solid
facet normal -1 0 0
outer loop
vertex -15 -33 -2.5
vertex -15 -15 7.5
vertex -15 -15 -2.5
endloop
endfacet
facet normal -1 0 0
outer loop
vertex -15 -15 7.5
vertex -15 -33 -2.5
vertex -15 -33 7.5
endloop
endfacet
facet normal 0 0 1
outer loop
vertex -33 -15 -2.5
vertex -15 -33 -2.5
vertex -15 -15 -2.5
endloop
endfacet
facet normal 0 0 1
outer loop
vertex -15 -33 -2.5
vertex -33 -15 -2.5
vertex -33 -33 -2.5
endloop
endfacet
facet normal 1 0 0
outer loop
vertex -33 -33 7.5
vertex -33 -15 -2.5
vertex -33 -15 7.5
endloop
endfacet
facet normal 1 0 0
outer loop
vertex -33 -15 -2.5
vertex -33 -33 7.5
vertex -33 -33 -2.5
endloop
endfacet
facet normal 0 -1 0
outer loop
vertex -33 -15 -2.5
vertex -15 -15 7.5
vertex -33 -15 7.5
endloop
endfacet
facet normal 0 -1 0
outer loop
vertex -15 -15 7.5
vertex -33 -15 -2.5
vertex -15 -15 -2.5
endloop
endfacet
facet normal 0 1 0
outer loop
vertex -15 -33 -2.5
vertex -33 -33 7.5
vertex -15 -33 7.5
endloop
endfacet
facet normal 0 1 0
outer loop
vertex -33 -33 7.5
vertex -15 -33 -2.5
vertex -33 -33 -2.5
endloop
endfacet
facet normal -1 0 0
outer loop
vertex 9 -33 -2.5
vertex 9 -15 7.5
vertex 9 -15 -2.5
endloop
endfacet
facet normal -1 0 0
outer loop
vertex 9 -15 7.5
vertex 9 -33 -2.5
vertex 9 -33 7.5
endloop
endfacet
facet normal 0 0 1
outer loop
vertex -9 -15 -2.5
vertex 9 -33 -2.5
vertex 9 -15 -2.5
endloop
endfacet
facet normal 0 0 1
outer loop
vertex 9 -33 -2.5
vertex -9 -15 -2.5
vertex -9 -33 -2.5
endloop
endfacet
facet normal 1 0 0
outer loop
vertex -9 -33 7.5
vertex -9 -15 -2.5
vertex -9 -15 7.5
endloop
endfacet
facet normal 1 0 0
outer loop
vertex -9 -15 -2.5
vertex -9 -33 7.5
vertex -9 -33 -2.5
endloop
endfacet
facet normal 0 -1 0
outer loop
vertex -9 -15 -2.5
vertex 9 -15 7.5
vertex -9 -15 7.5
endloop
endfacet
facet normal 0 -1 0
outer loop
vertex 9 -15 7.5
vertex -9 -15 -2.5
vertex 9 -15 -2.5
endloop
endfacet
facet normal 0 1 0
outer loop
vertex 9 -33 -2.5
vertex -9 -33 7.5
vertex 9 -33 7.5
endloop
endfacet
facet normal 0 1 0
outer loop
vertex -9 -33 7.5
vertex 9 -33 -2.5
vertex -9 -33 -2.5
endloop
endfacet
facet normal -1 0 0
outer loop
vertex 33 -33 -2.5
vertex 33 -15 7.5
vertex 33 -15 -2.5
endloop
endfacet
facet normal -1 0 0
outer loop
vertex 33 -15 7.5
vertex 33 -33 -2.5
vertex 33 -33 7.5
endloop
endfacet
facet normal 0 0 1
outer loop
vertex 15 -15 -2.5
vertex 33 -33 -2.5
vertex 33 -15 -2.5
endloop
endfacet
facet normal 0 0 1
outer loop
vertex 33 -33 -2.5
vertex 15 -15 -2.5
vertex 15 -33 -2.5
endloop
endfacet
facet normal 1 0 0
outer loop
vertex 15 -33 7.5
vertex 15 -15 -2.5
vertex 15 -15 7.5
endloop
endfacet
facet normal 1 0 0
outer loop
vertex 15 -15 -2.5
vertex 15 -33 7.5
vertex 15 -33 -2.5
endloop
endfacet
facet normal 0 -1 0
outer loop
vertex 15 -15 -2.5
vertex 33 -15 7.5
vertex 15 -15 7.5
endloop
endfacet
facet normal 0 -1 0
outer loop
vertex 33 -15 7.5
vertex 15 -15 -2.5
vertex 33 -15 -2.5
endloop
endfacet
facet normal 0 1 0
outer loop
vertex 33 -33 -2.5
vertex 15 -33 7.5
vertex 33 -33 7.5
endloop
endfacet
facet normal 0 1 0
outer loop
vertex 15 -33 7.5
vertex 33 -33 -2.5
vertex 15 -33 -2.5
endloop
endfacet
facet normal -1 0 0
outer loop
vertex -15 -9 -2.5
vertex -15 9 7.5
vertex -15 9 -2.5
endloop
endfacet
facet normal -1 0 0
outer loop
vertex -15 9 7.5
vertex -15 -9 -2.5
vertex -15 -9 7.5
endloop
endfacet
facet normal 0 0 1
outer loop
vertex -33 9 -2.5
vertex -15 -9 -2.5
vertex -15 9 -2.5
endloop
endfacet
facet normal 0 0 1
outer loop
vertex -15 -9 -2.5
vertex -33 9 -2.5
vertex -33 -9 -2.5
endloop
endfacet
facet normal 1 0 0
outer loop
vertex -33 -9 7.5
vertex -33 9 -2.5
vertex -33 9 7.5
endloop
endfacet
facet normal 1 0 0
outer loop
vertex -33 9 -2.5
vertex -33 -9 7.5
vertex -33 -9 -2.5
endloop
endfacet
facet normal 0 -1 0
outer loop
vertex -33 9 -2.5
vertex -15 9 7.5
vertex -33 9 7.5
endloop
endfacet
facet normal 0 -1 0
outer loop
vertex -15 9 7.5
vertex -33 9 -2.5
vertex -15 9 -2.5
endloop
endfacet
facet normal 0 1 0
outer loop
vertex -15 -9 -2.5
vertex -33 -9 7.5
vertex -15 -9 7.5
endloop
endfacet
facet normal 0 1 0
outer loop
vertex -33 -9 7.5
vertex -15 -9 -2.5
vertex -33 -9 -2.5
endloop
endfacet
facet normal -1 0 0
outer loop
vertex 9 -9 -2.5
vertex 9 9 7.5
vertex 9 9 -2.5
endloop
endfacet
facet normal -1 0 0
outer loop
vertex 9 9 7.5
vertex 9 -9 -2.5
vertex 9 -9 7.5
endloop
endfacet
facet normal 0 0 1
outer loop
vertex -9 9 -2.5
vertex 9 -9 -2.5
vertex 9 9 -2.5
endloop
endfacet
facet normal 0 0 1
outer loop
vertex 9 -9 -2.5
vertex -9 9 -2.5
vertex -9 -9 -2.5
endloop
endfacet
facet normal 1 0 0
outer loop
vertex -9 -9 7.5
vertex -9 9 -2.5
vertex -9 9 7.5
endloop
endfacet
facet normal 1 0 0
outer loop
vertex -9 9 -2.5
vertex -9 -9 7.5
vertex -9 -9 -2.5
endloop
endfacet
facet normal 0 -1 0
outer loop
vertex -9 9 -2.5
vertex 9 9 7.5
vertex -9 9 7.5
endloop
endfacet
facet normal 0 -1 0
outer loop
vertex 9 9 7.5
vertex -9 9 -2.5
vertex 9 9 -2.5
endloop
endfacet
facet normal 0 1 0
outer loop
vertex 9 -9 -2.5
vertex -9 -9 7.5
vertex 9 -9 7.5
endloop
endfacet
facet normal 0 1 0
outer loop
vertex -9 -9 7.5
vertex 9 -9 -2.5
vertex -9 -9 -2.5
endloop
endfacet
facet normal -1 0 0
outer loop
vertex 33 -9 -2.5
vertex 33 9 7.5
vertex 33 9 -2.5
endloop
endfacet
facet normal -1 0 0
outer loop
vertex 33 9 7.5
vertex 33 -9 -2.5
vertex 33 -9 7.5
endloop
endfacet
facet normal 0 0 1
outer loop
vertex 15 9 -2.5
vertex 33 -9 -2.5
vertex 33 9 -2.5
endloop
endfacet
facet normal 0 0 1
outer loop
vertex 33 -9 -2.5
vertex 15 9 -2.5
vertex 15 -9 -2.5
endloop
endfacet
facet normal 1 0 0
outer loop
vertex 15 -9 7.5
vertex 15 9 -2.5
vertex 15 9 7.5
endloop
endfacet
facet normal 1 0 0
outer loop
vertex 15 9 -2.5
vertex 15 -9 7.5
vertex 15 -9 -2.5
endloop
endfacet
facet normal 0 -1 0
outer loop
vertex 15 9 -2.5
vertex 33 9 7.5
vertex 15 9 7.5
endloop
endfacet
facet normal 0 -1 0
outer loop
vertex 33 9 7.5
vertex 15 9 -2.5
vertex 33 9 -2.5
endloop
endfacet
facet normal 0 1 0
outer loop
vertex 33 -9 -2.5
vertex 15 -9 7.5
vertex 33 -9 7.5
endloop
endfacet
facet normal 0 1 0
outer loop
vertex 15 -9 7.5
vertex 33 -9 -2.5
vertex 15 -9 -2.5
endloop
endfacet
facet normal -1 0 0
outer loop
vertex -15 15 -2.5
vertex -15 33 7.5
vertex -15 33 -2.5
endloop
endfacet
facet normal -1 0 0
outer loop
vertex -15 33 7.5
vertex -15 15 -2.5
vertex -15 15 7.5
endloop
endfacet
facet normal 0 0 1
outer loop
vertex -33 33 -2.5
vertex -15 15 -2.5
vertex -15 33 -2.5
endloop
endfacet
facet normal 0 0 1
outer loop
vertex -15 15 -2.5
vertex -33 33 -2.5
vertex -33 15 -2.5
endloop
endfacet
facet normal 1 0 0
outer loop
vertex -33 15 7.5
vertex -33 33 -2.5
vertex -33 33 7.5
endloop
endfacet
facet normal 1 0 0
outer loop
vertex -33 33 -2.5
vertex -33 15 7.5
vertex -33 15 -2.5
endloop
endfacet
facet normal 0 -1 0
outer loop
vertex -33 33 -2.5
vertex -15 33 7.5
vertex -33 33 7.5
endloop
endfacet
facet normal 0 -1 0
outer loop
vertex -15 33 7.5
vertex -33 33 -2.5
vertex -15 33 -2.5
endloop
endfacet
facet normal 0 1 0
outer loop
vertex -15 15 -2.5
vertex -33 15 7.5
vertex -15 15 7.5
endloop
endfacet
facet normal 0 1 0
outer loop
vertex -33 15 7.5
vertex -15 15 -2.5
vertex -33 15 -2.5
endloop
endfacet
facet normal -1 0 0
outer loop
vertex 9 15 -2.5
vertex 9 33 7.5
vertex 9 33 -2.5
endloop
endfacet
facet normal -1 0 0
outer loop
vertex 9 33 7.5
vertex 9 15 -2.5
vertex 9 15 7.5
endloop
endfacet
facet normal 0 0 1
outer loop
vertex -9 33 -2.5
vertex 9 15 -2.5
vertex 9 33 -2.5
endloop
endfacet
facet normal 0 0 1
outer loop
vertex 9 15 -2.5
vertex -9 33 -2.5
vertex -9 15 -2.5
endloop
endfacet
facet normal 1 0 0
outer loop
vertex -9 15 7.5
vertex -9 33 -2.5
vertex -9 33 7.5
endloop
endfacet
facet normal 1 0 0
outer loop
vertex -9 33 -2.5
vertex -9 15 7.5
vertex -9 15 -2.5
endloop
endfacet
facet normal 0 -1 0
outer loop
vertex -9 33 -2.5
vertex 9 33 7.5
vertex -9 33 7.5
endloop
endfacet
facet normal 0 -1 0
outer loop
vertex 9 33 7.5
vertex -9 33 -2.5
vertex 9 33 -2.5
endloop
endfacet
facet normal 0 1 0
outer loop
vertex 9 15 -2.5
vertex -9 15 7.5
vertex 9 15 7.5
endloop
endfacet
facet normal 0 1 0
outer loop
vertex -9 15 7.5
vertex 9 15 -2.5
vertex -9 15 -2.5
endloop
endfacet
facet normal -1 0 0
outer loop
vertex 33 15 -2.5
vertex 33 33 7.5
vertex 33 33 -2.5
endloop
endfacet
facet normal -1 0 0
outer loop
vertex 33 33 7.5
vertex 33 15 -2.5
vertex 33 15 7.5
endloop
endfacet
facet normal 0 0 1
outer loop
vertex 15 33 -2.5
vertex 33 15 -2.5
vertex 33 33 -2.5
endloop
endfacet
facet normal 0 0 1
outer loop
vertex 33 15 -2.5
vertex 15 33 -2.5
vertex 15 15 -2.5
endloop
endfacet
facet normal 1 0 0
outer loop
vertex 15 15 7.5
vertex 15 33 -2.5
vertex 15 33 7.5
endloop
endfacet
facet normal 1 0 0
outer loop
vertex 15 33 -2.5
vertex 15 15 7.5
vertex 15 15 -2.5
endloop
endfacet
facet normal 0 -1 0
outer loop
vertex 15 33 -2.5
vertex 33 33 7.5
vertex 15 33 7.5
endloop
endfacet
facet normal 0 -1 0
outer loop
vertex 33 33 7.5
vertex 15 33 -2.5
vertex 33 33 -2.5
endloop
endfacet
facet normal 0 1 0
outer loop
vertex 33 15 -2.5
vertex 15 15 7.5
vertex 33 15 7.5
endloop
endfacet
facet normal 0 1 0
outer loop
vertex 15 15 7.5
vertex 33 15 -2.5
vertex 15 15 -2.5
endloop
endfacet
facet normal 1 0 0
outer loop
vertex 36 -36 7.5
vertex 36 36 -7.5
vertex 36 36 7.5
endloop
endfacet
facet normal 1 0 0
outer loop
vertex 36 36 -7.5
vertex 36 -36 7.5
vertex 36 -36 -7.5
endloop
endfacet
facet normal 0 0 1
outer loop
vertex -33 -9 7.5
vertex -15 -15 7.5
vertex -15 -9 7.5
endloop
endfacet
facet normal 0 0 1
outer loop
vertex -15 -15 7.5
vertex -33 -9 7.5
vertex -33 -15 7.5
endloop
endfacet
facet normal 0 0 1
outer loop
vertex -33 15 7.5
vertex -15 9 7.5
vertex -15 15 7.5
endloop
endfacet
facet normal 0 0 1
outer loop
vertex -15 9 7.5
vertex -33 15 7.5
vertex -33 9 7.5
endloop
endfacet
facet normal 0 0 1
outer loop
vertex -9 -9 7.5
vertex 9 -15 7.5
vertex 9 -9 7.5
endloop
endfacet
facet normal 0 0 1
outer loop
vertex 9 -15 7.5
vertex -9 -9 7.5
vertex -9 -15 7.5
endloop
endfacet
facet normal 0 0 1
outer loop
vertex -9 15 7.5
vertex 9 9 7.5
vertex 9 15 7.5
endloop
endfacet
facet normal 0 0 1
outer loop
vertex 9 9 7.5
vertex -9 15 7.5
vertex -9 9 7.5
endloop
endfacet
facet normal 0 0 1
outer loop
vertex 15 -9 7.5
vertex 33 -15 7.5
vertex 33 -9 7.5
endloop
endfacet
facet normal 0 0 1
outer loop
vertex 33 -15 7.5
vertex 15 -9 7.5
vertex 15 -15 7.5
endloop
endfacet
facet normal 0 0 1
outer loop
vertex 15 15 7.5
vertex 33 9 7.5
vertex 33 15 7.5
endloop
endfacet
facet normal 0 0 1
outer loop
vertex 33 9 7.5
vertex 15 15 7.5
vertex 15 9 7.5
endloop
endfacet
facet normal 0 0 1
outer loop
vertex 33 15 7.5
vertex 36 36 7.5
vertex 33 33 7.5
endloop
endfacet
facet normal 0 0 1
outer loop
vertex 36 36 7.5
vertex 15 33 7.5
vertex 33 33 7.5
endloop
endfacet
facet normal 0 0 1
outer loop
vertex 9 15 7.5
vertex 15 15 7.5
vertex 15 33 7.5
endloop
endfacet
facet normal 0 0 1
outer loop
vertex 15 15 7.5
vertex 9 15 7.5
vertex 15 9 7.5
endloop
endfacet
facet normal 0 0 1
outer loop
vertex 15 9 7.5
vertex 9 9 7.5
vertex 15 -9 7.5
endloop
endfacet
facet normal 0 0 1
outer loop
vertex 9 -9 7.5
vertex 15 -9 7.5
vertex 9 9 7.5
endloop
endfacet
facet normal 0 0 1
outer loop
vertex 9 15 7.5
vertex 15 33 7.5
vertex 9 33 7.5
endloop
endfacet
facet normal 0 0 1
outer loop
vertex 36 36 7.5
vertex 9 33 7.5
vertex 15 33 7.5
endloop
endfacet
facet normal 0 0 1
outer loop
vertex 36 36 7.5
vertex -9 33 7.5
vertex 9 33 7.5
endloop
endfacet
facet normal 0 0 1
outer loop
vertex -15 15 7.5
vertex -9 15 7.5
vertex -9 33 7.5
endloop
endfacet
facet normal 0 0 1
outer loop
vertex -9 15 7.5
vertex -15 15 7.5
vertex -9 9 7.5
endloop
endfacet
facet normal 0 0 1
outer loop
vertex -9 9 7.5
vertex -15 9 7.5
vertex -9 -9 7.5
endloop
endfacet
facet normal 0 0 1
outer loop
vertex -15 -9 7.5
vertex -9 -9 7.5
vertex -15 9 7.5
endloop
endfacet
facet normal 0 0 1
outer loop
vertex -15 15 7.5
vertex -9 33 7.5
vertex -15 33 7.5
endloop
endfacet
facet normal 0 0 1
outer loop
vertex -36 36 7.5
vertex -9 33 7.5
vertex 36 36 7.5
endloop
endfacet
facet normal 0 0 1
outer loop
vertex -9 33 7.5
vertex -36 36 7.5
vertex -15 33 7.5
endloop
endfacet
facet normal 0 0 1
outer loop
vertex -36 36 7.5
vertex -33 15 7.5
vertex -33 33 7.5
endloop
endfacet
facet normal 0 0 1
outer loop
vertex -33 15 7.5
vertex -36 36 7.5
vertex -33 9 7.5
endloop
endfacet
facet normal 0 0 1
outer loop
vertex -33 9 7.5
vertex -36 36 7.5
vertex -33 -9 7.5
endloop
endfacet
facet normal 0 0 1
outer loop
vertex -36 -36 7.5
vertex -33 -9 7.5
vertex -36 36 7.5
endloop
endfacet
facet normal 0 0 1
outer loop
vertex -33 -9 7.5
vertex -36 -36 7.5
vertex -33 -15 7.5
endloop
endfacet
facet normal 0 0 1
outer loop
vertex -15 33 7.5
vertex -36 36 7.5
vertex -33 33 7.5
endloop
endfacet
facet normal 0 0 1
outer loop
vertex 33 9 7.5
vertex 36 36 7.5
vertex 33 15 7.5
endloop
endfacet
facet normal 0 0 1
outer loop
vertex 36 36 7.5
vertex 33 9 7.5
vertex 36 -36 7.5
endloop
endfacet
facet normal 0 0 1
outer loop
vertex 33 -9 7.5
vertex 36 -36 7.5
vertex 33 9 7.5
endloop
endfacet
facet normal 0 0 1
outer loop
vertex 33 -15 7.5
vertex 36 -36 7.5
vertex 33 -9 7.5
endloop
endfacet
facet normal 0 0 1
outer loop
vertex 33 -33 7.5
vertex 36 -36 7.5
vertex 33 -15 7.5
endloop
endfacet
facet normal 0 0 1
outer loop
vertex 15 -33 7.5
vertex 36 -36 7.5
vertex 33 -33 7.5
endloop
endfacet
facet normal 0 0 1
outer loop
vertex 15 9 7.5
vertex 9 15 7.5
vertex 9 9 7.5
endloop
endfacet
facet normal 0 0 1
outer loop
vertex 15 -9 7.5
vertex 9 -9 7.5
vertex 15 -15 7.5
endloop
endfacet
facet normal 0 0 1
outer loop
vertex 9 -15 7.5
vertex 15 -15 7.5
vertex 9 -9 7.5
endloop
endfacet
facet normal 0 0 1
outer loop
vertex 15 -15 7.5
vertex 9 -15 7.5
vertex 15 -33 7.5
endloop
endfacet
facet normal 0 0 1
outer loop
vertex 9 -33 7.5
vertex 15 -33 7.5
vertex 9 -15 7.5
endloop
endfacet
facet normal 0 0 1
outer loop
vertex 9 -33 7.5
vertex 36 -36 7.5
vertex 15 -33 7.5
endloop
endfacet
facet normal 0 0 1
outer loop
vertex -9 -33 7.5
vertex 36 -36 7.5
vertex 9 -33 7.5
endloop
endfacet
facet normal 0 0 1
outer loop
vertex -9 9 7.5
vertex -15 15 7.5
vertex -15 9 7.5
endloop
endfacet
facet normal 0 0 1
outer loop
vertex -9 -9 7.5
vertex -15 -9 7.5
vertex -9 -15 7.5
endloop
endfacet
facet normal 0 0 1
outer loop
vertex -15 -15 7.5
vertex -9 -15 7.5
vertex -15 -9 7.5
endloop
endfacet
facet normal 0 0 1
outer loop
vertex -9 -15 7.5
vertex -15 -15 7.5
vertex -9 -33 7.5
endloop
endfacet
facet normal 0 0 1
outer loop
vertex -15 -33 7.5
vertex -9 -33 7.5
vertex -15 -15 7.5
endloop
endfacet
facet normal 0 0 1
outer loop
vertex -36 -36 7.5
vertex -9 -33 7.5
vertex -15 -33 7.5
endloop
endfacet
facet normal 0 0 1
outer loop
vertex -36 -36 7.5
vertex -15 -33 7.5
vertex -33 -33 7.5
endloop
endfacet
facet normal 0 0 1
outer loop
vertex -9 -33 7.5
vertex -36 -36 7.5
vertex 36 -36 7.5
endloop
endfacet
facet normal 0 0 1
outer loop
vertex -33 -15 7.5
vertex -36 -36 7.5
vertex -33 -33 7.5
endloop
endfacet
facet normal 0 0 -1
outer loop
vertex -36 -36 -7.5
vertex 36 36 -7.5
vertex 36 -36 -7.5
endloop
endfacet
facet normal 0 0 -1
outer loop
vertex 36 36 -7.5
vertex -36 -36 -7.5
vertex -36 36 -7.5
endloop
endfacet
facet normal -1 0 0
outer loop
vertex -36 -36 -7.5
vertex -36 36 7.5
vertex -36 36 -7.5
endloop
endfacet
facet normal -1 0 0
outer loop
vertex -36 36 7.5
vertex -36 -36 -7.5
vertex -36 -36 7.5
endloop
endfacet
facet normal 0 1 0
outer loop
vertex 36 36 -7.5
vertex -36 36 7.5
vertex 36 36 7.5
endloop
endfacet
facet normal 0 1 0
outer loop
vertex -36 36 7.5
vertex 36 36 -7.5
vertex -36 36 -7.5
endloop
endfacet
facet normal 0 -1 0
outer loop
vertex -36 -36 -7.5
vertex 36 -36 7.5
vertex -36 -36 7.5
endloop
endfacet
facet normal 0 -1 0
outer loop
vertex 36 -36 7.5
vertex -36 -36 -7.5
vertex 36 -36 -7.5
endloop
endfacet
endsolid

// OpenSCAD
$fn = 32;

// ----------------------------------------------------------------------
// Pocket plate 72 x 72 x 15
// 3 x 3 pockets 18 mm square, 10 mm deep
// ----------------------------------------------------------------------

// --- parameters (mm) ---
thickness = 15;  // plate thickness
floor_t = 5;     // material left under each pocket
pocket = 18;     // pocket side length
pitch_x = 24;    // pocket pitch along X
pitch_y = 24;    // pocket pitch along Y
cols = 3;        // pockets per row
rows = 3;        // rows of pockets

// --- derived feature positions (mm) ---
depth = thickness - floor_t;        // = 10   pocket depth, down to the floor
span_x = (cols - 1) * pitch_x;      // = 48   distance between outer pockets
span_y = (rows - 1) * pitch_y;      // = 48   distance between outer pocket rows
origin_x = -span_x / 2;             // = -24   X of the first pocket
origin_y = -span_y / 2;             // = -24   Y of the first pocket
plate = [span_x + pocket + 6, span_y + pocket + 6, thickness];  // = [72, 72, 15]   overall size: pockets plus 3 mm of wall on each side
feature_centers = [
  [origin_x + 0 * pitch_x, origin_y + 0 * pitch_y],
  [origin_x + 1 * pitch_x, origin_y + 0 * pitch_y],
  [origin_x + 2 * pitch_x, origin_y + 0 * pitch_y],
  [origin_x + 0 * pitch_x, origin_y + 1 * pitch_y],
  [origin_x + 1 * pitch_x, origin_y + 1 * pitch_y],
  [origin_x + 2 * pitch_x, origin_y + 1 * pitch_y],
  [origin_x + 0 * pitch_x, origin_y + 2 * pitch_y],
  [origin_x + 1 * pitch_x, origin_y + 2 * pitch_y],
  [origin_x + 2 * pitch_x, origin_y + 2 * pitch_y]
];   // pocket centres, used verbatim by the cutter loop

// plate outline, then one pocket per centre in feature_centers
difference() {
  cube(plate, center = true);
  for (centre = feature_centers)
    translate([centre[0] - pocket / 2, centre[1] - pocket / 2, plate[2] / 2 - depth])
      cube([pocket, pocket, depth + 1]);  // centred on the declared pocket centre
}
